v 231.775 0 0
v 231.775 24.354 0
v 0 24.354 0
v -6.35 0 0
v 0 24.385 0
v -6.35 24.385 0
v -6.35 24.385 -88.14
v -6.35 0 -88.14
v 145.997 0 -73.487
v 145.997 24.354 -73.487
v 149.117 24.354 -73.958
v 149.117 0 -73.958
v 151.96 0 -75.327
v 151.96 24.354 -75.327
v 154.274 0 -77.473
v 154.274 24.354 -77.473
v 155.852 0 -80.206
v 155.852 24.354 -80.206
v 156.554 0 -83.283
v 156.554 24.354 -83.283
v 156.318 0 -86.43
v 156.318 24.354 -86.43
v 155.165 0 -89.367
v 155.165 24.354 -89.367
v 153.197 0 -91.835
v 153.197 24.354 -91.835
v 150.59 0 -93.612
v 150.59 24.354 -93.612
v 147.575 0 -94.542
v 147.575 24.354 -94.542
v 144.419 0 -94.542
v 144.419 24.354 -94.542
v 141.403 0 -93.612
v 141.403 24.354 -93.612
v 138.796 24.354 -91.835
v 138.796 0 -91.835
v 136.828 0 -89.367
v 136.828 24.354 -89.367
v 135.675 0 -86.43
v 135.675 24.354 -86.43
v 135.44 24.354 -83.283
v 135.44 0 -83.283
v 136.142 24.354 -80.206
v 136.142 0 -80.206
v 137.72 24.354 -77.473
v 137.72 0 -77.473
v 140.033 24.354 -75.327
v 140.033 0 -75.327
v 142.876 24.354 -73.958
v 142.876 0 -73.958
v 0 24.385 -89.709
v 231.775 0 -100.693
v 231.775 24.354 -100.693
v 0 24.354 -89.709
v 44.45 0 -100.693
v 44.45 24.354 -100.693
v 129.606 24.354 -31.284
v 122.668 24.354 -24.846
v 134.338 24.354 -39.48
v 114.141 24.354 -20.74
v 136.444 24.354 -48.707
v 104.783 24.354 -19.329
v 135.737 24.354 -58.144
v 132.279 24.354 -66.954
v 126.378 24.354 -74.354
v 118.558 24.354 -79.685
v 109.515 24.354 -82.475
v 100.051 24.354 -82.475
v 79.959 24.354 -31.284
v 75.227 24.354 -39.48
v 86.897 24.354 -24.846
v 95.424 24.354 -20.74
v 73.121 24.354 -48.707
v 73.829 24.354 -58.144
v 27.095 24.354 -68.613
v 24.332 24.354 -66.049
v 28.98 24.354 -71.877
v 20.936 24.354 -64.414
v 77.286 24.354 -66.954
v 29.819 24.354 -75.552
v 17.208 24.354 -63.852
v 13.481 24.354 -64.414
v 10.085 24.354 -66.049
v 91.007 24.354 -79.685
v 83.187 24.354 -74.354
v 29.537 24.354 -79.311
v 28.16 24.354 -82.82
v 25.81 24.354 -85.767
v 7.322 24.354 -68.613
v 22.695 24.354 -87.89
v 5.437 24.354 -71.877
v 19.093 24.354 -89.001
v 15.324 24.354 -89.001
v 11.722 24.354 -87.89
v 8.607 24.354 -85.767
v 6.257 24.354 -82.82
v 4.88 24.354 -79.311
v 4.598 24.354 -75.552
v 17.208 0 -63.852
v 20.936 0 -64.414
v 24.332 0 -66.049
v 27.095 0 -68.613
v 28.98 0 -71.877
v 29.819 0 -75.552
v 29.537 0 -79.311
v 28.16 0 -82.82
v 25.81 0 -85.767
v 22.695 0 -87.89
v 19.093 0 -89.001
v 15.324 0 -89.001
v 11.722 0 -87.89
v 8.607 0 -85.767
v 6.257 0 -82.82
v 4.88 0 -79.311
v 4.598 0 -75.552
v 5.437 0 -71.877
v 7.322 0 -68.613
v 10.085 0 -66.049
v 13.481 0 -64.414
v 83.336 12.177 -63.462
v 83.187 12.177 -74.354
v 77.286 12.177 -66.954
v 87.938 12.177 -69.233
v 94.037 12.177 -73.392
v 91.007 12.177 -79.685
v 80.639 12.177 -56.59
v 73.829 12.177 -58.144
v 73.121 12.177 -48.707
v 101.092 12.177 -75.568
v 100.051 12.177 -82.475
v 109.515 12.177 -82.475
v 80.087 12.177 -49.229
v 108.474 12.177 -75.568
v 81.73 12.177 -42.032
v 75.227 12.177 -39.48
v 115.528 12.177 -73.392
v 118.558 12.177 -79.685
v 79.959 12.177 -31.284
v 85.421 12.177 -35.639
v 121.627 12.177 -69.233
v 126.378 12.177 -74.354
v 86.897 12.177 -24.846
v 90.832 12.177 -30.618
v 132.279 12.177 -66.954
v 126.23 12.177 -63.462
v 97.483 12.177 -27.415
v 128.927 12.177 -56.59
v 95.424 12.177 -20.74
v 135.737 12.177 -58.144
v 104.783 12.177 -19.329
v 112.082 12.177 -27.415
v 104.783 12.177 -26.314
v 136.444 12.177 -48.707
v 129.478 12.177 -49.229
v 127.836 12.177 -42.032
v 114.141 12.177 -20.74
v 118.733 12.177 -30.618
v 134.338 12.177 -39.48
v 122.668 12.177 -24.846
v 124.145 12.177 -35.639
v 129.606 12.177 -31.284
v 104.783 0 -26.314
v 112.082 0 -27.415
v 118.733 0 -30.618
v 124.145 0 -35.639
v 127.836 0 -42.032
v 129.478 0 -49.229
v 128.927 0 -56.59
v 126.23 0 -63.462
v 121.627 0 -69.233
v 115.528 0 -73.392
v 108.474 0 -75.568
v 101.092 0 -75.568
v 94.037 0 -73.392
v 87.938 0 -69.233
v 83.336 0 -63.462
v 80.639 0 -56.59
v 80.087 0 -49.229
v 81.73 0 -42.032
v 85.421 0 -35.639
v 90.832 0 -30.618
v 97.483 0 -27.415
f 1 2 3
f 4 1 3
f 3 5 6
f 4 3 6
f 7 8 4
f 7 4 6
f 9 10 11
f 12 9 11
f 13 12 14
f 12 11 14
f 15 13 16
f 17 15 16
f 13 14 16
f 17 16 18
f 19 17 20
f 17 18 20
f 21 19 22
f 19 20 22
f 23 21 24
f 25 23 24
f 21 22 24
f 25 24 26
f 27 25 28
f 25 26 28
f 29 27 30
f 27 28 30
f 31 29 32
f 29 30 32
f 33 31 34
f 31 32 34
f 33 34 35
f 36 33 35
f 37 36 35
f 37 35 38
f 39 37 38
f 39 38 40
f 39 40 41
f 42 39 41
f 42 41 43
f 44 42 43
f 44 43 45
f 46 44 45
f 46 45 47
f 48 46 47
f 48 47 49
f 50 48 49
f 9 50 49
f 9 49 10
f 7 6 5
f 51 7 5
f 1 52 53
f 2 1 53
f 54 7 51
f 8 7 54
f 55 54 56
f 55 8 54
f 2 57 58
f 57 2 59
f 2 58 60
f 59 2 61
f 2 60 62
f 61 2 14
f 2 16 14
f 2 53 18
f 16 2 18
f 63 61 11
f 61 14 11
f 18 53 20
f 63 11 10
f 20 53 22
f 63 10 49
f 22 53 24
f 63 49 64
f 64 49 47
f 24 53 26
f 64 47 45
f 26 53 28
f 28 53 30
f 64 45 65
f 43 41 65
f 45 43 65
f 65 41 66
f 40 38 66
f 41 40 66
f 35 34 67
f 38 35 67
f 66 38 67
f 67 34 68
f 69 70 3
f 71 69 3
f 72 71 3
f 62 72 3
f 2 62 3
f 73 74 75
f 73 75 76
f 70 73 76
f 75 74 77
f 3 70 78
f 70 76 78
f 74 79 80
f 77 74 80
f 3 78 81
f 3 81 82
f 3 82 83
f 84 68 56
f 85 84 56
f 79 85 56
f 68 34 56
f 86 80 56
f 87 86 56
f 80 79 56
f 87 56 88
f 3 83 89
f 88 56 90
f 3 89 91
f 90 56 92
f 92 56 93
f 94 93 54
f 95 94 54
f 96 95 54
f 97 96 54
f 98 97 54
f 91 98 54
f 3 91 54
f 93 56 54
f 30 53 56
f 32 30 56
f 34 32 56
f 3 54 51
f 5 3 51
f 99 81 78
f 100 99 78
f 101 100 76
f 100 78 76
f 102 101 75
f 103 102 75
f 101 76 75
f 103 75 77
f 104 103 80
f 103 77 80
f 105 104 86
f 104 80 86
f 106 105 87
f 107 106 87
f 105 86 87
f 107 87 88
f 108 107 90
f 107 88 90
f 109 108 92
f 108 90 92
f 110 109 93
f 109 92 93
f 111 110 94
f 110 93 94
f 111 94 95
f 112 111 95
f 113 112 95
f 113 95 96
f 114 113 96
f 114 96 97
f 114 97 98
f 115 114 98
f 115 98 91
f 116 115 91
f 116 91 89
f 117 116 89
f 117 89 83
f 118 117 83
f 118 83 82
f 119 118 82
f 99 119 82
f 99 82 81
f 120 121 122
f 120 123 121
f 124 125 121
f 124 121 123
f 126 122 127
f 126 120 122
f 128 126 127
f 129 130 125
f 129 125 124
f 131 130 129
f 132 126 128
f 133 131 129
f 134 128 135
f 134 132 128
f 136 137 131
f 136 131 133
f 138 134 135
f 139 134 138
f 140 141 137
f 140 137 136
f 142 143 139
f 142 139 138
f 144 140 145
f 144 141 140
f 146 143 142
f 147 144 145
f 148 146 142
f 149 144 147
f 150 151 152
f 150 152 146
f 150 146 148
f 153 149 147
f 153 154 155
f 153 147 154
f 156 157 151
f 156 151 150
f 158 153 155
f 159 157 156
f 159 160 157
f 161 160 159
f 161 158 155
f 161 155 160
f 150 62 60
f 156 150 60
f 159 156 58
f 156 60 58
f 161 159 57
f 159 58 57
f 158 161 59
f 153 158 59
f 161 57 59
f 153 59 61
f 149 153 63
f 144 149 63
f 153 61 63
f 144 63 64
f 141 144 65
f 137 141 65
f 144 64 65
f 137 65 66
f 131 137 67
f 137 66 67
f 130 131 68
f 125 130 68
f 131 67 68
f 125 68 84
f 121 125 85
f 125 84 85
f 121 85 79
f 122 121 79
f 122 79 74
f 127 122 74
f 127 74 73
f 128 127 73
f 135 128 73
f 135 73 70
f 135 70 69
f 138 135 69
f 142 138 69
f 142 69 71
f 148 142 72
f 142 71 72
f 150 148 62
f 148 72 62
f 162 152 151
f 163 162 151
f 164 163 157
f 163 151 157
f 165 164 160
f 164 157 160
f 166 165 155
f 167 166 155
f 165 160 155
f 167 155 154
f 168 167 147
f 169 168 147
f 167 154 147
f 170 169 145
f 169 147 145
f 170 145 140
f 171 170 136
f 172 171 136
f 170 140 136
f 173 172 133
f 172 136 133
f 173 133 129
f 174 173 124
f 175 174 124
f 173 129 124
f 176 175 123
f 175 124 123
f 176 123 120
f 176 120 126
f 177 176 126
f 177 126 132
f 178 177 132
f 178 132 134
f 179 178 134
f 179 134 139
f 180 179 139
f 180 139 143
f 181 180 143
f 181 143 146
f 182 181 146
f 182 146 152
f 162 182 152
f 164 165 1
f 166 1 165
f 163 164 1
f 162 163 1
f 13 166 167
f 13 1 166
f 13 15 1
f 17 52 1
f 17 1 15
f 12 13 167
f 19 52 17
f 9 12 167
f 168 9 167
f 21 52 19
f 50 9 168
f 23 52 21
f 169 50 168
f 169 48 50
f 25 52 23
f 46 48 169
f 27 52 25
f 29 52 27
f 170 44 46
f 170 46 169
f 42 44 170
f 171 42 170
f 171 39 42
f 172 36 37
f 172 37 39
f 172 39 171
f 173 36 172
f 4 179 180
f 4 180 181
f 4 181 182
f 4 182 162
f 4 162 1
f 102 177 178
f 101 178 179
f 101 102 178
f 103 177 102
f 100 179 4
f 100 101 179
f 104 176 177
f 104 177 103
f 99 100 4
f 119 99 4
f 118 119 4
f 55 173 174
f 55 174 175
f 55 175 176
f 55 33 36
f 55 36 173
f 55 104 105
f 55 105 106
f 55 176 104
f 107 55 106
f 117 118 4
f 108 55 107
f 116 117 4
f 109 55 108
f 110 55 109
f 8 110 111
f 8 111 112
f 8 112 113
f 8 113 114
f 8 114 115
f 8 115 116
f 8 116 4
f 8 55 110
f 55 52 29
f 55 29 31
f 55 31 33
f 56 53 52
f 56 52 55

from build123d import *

# Parameters (mm, degrees)
SKETCH1_W               = 225.425
SKETCH1_H               = 100.69322
BOSS_EXTRUDE1_DEPTH     = 24.35352
SKETCH2_W               = 6.35
SKETCH2_H               = 24.385376466
BOSS_EXTRUDE2_DEPTH     = 100.69322
SKETCH3_W               = 6.35
SKETCH3_H               = 24.35352
BOSS_EXTRUDE3_DEPTH     = 100.69322
SKETCH4_R               = 12.64539
SKETCH4_R_2             = 10.58672
CUT_EXTRUDE1_DEPTH      = 254.873726713
CUT_EXTRUDE2_DEPTH      = 254.876784611
CUT_EXTRUDE2_DEPTH_BACK = 254.876784611
SKETCH16_R              = 31.75
SKETCH16_R_2            = 24.765
CUT_EXTRUDE6_DEPTH      = 12.17676
SKETCH17_R              = 24.765
CUT_EXTRUDE7_DEPTH      = 254.873726713


with BuildPart() as part:
    # Sketch1 → Boss-Extrude1 (new body)
    with BuildSketch(Plane(origin=(0, 0, 0), x_dir=(1, 0, 0), z_dir=(0, 1, 0))):
        with Locations((112.7125, 50.34661)):
            Rectangle(SKETCH1_W, SKETCH1_H)
    extrude(amount=BOSS_EXTRUDE1_DEPTH)

    # Sketch2 → Boss-Extrude2 (add)
    with BuildSketch(Plane.XY.offset(-100.69322)):
        with Locations((-3.175, 12.192688233)):
            Rectangle(SKETCH2_W, SKETCH2_H)
    extrude(amount=BOSS_EXTRUDE2_DEPTH)

    # Sketch3 → Boss-Extrude3 (add)
    with BuildSketch(Plane(origin=(225.425, 0, -100.69322), x_dir=(-1, 0, 0), z_dir=(0, 0, -1))):
        with Locations((-3.175, 12.17676)):
            Rectangle(SKETCH3_W, SKETCH3_H)
    extrude(amount=-BOSS_EXTRUDE3_DEPTH)

    # Sketch4 → Cut-Extrude1 (cut, through all)
    with BuildSketch(Plane(origin=(0, 24.35352, 0), x_dir=(1, 0, 0), z_dir=(0, 1, 0))):
        with Locations(Location((17.2085, 76.49718, 0), (0, 0, 270))):
            Circle(SKETCH4_R)
        with Locations(Location((145.99666, 84.074, 0), (0, 0, 270))):
            Circle(SKETCH4_R_2)
    extrude(amount=-CUT_EXTRUDE1_DEPTH, mode=Mode.SUBTRACT)

    # Sketch5 → Cut-Extrude2 (cut, two sides: drawn at the far end of the back side and taken through both)
    with BuildSketch(Plane(origin=(0, 24.385376466, 0), x_dir=(1, 0, 0), z_dir=(0, 1, 0)).offset(-CUT_EXTRUDE2_DEPTH_BACK)):
        Polygon((-509.055541284, -36.086678247), (-6.35, 88.139743453), (44.45, 100.69322), (547.155541284, 224.9196417), (298.702697883, 1230.330724268), (-757.508384685, 969.324404321), align=None)
    extrude(amount=CUT_EXTRUDE2_DEPTH + CUT_EXTRUDE2_DEPTH_BACK, mode=Mode.SUBTRACT)

    # Sketch16 → Cut-Extrude6 (cut)
    with BuildSketch(Plane(origin=(0, 24.35352, 0), x_dir=(1, 0, 0), z_dir=(0, 1, 0))):
        with Locations(Location((104.78262, 51.0794, 0), (0, 0, 270))):
            Circle(SKETCH16_R)
        with Locations(Location((104.78262, 51.0794, 0), (0, 0, 270))):
            Circle(SKETCH16_R_2, mode=Mode.SUBTRACT)
    extrude(amount=-CUT_EXTRUDE6_DEPTH, mode=Mode.SUBTRACT)

    # Sketch17 → Cut-Extrude7 (cut, through all)
    with BuildSketch(Plane(origin=(0, 24.35352, 0), x_dir=(1, 0, 0), z_dir=(0, 1, 0))):
        with Locations(Location((104.78262, 51.0794, 0), (0, 0, 270))):
            Circle(SKETCH17_R)
    extrude(amount=-CUT_EXTRUDE7_DEPTH, mode=Mode.SUBTRACT)


solid = part.part
